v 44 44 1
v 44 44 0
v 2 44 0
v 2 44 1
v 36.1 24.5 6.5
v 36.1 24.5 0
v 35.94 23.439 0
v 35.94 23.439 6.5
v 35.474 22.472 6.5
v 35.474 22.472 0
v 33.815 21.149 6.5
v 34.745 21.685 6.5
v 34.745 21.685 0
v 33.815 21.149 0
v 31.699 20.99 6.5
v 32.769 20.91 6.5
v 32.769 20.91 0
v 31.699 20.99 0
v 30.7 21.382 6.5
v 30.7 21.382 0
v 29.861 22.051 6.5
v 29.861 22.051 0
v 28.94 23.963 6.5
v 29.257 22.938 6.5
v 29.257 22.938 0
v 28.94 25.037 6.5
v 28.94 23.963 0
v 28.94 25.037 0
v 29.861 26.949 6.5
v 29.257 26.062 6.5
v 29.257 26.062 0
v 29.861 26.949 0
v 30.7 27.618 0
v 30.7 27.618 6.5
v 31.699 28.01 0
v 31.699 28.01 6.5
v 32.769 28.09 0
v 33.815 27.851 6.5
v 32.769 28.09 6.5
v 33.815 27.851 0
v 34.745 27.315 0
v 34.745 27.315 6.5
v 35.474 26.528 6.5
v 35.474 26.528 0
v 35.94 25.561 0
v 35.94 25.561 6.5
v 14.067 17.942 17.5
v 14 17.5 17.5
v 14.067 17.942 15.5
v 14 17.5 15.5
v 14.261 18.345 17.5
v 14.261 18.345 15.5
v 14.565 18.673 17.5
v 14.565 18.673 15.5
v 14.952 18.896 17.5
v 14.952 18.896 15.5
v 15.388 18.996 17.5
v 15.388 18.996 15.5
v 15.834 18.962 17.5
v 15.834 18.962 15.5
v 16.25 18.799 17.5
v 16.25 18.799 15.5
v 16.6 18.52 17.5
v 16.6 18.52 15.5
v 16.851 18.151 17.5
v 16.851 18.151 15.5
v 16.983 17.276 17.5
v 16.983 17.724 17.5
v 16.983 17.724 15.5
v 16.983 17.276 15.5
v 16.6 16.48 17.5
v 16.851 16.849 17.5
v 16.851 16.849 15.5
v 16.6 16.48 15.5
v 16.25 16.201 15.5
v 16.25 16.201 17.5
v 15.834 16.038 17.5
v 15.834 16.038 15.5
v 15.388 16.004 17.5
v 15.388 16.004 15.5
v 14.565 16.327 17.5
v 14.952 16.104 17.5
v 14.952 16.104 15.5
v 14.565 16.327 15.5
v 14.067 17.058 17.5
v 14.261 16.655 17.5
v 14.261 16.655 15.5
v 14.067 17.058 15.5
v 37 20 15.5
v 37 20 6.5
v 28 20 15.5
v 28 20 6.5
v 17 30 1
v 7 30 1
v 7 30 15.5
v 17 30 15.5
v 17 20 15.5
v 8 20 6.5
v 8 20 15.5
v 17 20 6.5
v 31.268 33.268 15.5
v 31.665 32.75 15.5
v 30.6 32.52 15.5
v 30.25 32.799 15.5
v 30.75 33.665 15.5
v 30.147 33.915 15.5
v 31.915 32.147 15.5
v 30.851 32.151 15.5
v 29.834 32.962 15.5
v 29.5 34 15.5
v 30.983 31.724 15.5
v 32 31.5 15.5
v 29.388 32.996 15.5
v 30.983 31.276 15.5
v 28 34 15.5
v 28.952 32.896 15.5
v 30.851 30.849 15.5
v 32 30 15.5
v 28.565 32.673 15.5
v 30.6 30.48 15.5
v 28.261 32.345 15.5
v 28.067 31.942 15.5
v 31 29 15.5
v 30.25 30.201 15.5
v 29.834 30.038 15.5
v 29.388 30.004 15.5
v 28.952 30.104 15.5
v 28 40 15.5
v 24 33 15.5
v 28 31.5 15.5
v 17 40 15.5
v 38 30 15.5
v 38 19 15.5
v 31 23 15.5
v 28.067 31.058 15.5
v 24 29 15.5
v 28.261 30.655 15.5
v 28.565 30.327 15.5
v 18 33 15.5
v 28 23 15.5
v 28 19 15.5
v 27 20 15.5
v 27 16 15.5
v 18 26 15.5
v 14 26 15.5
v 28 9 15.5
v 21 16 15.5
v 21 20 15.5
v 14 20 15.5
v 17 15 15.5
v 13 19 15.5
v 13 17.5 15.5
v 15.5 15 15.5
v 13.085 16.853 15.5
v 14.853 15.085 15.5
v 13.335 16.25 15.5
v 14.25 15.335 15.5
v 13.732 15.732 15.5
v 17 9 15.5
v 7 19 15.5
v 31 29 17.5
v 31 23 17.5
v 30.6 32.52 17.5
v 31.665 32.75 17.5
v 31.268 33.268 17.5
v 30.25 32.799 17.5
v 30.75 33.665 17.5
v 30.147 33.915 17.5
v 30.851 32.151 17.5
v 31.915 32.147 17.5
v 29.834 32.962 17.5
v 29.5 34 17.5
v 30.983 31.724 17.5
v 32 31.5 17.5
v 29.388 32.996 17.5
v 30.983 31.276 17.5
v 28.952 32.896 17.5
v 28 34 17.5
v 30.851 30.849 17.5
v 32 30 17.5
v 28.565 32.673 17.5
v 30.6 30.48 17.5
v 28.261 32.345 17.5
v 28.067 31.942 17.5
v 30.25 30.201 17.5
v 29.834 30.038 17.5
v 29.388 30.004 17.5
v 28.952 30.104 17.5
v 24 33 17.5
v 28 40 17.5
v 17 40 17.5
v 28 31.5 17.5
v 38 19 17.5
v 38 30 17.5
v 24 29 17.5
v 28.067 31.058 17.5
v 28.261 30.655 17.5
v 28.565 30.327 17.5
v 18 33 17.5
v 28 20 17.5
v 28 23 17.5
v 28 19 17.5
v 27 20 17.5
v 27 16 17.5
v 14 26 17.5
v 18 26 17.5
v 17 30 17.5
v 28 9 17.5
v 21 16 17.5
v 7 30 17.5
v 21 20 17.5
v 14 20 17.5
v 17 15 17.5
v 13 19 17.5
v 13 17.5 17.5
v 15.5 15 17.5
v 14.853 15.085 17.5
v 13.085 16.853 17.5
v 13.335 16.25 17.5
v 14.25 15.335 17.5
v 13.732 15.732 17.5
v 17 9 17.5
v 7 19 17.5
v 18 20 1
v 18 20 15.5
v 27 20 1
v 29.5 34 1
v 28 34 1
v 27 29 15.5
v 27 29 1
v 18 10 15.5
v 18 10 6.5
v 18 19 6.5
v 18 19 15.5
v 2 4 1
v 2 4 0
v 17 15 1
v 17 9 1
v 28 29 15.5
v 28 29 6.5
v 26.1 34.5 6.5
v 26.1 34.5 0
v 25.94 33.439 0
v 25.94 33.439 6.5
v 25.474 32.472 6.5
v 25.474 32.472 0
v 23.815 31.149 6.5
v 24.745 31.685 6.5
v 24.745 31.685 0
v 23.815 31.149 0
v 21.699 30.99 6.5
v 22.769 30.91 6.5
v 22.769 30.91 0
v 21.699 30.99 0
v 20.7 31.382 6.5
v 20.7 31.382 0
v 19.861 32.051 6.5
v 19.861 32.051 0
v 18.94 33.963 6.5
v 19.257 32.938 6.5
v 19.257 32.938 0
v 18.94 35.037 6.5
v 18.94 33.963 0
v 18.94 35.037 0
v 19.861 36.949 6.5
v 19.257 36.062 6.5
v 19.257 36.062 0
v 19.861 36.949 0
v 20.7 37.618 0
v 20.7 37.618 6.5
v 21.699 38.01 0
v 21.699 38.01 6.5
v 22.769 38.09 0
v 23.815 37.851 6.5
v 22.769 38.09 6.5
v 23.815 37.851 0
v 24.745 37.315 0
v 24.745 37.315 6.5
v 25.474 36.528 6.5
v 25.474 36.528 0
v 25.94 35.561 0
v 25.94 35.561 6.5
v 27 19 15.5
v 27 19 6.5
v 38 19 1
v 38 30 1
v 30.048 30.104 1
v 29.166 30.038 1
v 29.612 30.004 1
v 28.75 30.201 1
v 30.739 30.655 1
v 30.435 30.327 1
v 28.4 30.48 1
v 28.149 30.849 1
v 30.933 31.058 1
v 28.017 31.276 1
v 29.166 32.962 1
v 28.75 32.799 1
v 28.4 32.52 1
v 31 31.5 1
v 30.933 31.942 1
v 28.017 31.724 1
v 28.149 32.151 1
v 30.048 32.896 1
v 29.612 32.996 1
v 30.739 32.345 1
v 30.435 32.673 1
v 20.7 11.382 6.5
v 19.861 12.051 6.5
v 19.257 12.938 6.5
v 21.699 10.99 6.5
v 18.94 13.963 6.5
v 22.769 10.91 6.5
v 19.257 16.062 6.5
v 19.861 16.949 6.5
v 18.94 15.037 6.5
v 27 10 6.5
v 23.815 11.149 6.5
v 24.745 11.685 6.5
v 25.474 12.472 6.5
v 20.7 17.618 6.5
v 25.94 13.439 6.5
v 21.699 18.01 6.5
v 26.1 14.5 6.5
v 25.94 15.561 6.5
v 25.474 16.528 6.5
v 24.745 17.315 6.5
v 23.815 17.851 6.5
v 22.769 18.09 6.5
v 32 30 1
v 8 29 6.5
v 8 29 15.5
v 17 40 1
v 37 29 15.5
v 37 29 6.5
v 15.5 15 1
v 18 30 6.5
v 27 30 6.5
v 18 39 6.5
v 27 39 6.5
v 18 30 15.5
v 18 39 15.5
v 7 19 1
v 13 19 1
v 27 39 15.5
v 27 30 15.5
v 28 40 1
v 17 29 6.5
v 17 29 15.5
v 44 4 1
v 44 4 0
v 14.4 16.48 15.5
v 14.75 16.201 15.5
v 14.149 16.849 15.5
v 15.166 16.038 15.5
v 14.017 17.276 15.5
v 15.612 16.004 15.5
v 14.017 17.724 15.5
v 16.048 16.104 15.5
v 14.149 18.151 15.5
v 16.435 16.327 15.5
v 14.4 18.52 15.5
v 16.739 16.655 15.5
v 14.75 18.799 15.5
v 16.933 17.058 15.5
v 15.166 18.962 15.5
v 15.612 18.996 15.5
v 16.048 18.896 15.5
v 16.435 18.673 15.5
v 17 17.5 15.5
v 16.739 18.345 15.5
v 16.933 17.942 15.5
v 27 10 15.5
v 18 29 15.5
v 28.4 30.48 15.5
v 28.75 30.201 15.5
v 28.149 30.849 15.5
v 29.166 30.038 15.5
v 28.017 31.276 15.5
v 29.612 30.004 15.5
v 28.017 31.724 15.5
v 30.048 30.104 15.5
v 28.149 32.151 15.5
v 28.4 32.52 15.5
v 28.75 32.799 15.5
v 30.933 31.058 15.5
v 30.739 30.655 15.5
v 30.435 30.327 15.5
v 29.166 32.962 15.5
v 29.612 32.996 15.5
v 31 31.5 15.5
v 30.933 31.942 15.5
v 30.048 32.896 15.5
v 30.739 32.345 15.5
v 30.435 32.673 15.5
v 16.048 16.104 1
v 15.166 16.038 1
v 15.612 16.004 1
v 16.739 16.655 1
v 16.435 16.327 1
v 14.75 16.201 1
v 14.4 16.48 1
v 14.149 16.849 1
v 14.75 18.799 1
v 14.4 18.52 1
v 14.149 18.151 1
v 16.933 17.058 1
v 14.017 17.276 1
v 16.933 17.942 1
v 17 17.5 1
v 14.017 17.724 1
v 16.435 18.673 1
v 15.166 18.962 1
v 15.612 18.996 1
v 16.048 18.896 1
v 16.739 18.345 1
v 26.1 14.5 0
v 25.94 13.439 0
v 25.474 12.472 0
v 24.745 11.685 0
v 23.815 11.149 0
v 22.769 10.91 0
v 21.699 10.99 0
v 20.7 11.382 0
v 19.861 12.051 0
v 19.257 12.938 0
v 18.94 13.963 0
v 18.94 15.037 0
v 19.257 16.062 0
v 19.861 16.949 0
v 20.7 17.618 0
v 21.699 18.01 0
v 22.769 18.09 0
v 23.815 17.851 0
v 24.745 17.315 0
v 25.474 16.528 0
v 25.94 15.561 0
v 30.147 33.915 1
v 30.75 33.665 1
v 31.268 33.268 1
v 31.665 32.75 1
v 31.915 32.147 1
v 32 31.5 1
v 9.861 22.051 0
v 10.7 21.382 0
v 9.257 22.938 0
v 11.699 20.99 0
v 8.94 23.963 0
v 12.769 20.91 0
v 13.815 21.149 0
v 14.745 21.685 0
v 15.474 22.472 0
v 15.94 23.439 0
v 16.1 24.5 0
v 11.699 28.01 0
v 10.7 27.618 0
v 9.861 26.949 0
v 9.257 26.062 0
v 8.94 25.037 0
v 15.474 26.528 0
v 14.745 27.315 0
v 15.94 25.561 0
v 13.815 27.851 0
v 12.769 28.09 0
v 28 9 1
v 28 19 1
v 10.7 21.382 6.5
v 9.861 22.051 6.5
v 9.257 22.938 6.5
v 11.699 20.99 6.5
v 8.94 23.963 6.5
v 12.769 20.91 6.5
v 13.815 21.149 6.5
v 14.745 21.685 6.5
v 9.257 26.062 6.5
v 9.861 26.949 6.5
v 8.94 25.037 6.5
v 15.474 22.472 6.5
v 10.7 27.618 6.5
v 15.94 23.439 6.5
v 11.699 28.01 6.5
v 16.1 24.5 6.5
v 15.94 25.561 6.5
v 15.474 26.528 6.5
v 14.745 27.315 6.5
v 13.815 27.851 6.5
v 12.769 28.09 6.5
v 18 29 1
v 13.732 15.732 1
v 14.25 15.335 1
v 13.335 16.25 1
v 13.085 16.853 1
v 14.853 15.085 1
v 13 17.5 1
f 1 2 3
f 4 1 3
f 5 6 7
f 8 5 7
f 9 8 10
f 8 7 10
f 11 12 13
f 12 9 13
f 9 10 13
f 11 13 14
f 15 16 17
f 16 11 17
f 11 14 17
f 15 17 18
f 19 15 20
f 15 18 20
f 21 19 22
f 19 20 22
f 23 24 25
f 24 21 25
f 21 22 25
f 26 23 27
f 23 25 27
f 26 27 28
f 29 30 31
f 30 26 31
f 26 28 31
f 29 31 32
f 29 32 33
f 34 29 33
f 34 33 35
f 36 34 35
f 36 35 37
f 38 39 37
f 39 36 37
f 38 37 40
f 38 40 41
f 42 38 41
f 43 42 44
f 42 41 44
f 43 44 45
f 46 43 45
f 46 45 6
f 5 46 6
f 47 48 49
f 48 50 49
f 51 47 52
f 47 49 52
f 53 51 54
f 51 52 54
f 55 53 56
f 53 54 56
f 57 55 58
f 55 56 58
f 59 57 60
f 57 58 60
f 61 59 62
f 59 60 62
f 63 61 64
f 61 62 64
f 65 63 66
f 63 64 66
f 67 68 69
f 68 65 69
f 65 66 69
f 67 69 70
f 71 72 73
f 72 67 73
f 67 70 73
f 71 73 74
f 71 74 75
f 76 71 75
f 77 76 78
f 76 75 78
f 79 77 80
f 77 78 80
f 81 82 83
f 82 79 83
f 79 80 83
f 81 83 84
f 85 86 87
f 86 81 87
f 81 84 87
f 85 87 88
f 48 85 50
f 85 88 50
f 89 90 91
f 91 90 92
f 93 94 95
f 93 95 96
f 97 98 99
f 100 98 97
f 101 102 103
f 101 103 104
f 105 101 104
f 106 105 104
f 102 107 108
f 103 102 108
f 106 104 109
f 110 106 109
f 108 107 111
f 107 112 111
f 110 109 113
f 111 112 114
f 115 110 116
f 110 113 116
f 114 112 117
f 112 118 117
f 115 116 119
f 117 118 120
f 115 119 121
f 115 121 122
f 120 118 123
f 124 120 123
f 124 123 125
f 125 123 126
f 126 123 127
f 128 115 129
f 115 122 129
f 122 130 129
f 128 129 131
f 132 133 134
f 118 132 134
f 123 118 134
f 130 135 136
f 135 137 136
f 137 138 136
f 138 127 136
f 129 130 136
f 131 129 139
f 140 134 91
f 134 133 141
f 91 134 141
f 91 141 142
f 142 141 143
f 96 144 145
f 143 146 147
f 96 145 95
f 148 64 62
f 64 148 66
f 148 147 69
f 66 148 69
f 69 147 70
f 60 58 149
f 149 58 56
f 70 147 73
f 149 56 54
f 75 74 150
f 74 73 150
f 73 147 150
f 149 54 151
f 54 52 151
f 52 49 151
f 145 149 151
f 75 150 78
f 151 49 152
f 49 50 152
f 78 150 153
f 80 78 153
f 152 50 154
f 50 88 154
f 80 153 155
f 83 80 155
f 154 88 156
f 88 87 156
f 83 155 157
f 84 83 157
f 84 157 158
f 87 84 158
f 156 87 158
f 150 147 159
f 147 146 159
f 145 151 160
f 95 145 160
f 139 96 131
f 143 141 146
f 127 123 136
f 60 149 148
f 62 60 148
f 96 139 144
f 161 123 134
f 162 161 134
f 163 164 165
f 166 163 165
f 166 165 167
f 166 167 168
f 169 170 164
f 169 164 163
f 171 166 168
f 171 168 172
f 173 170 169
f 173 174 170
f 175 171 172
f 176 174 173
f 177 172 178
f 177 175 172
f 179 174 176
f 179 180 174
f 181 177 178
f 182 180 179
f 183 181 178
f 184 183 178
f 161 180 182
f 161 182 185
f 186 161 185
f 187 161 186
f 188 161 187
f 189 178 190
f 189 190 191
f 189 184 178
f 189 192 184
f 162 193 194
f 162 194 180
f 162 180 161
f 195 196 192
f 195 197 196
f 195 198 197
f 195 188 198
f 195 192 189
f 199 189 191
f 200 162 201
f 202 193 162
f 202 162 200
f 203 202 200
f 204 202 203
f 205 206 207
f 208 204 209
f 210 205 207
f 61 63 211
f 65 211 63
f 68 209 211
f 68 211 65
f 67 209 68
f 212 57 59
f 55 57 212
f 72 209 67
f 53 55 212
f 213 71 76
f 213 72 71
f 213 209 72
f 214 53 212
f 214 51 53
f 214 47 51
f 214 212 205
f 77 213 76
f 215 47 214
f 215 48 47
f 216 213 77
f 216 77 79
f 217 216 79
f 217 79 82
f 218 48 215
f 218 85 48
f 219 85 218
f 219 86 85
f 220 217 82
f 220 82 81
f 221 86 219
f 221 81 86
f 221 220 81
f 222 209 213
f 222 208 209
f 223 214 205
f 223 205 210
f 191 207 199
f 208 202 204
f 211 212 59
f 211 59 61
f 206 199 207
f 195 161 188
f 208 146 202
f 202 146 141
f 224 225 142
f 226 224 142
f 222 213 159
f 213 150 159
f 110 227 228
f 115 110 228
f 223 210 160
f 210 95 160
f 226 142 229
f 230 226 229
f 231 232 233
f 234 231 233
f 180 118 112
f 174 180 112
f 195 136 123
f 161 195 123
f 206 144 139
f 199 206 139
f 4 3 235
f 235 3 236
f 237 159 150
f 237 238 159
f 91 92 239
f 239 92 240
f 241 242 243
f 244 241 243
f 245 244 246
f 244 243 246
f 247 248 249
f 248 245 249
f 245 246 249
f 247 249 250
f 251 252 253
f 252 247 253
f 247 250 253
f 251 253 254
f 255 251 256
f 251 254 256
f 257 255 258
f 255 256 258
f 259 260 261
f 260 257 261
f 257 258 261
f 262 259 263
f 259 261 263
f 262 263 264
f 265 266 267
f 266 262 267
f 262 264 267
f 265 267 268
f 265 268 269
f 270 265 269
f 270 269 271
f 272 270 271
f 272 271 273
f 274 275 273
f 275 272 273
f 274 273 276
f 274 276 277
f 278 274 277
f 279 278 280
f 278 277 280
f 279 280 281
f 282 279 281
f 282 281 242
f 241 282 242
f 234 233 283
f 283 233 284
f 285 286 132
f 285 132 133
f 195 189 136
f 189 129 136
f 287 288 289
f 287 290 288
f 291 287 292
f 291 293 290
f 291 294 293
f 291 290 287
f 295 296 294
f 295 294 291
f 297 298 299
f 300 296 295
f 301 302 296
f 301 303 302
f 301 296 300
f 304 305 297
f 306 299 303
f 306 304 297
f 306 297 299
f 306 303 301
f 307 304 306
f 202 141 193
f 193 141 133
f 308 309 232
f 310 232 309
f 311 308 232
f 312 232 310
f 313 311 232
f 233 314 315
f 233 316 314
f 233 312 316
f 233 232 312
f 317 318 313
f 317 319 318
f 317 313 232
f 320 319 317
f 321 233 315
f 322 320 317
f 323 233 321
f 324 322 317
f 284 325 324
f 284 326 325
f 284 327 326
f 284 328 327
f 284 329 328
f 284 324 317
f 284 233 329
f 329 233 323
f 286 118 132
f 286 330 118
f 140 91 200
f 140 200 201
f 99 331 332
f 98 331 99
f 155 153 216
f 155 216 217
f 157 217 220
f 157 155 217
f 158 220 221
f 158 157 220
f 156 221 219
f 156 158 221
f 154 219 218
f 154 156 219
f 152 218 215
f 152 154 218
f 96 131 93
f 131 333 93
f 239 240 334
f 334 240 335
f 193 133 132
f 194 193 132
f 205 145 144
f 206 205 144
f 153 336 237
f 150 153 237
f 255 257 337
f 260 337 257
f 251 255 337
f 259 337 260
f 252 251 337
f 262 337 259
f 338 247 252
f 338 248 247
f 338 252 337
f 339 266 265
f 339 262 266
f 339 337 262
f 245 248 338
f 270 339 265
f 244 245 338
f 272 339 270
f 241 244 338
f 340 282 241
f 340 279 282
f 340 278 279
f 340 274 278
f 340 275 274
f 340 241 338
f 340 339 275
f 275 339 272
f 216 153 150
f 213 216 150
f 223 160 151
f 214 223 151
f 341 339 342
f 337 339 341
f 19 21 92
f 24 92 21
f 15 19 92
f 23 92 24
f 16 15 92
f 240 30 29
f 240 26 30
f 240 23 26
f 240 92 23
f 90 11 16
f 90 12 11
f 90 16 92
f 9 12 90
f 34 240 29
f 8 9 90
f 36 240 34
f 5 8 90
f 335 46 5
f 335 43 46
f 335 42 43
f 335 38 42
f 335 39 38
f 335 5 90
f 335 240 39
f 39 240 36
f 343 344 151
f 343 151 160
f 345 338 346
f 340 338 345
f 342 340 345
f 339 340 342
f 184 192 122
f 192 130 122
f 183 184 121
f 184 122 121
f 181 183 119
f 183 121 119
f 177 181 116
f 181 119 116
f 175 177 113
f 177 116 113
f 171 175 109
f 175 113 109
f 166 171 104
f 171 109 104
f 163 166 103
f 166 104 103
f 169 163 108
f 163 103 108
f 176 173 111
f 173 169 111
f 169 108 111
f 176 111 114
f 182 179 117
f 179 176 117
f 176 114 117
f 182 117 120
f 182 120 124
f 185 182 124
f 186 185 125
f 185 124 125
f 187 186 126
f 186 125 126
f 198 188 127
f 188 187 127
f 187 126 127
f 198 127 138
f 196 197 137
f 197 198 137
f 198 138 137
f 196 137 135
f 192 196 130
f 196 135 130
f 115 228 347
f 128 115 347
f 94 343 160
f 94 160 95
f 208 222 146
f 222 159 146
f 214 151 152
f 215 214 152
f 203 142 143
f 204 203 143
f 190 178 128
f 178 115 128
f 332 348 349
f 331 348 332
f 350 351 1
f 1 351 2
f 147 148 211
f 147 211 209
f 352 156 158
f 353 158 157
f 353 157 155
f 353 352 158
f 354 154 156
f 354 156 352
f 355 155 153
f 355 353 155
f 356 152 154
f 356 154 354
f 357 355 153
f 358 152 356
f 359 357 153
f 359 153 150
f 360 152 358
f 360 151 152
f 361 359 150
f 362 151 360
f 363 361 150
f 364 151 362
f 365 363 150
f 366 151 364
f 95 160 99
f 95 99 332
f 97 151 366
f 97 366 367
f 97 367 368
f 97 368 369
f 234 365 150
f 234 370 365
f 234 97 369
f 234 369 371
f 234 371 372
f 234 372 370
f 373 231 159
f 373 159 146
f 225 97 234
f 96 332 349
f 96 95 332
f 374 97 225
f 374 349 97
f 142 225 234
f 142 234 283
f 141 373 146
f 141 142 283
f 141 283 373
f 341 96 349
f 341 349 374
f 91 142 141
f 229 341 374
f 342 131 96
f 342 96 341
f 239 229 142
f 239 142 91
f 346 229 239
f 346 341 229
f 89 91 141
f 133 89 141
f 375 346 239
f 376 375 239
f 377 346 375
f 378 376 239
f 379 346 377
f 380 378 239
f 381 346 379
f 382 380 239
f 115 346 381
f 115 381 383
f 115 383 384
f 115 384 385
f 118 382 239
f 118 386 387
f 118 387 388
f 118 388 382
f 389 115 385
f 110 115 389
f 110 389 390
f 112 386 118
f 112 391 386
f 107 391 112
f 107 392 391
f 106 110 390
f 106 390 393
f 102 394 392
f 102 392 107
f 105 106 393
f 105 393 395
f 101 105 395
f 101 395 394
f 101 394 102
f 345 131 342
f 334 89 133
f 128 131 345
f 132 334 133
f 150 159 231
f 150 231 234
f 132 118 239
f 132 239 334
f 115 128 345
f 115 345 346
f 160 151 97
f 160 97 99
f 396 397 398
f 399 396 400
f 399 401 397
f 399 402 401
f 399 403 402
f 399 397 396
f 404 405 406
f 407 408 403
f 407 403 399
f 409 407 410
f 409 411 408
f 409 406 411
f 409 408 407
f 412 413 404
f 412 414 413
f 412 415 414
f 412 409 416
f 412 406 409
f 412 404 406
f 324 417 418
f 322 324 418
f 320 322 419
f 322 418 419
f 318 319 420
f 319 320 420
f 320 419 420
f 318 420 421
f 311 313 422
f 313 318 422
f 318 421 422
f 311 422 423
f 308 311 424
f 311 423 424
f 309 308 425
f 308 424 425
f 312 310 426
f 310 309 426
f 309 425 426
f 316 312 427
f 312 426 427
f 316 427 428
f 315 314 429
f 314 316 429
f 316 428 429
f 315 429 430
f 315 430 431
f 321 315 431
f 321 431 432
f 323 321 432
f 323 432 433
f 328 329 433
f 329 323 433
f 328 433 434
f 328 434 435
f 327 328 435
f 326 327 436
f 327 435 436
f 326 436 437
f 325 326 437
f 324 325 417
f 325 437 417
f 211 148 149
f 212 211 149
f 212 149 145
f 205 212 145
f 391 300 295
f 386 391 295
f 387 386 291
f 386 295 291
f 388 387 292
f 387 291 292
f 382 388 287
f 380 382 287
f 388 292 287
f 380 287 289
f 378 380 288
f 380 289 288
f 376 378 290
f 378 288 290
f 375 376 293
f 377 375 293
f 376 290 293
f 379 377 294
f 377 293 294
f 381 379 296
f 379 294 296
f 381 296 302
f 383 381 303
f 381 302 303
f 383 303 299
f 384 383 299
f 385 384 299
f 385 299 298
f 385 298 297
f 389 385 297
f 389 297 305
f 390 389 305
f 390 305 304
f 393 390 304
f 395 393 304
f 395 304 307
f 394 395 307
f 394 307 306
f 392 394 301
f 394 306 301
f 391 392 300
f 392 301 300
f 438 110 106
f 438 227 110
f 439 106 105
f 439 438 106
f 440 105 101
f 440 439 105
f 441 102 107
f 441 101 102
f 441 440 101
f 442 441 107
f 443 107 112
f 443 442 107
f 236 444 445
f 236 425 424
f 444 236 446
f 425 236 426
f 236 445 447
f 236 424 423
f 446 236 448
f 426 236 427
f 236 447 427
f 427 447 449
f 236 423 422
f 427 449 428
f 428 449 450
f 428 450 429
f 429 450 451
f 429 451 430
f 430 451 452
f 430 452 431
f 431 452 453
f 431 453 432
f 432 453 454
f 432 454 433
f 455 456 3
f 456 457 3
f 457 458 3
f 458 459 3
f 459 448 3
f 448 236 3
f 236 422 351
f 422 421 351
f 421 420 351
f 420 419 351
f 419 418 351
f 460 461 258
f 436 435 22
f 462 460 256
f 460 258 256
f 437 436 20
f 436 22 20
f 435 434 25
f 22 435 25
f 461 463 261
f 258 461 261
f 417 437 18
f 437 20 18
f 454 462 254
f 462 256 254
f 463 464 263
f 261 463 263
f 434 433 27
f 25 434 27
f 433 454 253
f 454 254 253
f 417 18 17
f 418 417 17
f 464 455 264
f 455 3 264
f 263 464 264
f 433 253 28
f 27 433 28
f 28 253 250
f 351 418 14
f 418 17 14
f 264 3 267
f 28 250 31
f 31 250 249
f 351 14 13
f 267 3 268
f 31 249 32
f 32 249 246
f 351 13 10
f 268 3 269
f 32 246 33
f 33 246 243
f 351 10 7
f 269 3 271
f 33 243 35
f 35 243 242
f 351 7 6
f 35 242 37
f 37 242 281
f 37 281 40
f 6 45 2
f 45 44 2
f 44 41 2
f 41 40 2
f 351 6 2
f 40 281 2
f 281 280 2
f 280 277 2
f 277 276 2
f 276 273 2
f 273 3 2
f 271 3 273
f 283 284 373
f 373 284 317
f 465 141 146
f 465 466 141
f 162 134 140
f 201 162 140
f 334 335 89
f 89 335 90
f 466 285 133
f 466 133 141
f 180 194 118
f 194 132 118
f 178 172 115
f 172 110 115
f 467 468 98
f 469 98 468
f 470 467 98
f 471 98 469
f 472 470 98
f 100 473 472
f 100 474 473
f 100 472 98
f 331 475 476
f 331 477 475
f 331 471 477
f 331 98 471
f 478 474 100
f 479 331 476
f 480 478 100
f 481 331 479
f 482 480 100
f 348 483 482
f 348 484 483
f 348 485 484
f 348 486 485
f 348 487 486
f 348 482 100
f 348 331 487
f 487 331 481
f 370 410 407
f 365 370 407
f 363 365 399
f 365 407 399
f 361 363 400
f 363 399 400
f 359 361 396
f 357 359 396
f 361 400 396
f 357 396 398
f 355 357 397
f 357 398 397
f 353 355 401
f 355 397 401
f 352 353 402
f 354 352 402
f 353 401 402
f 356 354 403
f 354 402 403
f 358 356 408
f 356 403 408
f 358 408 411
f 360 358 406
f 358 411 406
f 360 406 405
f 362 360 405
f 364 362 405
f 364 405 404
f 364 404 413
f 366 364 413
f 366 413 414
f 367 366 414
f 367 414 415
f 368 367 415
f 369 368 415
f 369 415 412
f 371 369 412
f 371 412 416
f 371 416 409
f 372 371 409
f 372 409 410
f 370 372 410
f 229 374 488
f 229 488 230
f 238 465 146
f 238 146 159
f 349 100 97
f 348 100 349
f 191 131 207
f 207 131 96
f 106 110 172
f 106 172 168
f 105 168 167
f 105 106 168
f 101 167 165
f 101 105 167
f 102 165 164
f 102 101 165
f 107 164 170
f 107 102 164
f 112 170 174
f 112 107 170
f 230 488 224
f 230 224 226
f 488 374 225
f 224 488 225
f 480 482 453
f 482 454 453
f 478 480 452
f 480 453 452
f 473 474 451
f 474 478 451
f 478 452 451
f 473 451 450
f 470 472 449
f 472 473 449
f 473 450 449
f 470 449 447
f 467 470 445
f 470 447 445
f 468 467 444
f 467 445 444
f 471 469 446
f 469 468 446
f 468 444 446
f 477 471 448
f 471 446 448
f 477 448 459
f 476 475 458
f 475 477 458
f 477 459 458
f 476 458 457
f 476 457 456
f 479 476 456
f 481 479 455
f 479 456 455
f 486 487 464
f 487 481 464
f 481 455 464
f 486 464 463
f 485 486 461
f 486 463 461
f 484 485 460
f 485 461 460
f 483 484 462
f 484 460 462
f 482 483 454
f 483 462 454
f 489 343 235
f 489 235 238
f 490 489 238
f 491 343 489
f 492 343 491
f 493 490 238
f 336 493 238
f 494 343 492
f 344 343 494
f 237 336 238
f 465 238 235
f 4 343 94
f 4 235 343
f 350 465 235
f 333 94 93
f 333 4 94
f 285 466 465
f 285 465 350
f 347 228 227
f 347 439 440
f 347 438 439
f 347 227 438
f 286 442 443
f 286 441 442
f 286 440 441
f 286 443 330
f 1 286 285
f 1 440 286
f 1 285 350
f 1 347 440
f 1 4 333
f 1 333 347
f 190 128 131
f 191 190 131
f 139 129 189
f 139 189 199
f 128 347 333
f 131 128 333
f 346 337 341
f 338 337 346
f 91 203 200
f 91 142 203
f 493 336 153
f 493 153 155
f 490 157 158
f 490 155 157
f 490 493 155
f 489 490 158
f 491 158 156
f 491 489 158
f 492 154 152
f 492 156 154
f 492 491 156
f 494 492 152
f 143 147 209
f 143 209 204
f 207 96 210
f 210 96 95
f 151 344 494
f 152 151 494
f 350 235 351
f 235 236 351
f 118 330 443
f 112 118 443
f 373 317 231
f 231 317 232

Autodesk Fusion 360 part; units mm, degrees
sketch "Button Face" plane through (0, 0, 0) normal (0, 0, 1) x (1, 0, 0)
  line L0 (2, 4) -> (44, 4)
  line L1 (44, 4) -> (44, 44)
  line L2 (44, 44) -> (2, 44)
  line L3 (2, 44) -> (2, 4)
  line L4 (7, 30) -> (18, 30)
  line L5 (18, 30) -> (18, 19)
  line L6 (18, 19) -> (7, 19)
  line L7 (7, 19) -> (7, 30)
  line L8 (17, 29) -> (28, 29)
  line L9 (28, 29) -> (28, 40)
  line L10 (28, 40) -> (17, 40)
  line L11 (17, 40) -> (17, 29)
  line L12 (27, 30) -> (38, 30)
  line L13 (38, 30) -> (38, 19)
  line L14 (38, 19) -> (27, 19)
  line L15 (27, 19) -> (27, 30)
  line L16 (17, 20) -> (28, 20)
  line L17 (28, 20) -> (28, 9)
  line L18 (28, 9) -> (17, 9)
  line L19 (17, 9) -> (17, 20)
  line L20 (28, 29) -> (37, 29)
  line L21 (37, 29) -> (37, 20)
  line L22 (37, 20) -> (28, 20)
  line L23 (28, 20) -> (28, 29)
  line L24 (17, 29) -> (8, 29)
  line L25 (8, 29) -> (8, 20)
  line L26 (8, 20) -> (17, 20)
  line L27 (17, 20) -> (17, 29)
  line L28 (18, 19) -> (27, 19)
  line L29 (27, 19) -> (27, 10)
  line L30 (27, 10) -> (18, 10)
  line L31 (18, 10) -> (18, 19)
  line L32 (18, 30) -> (27, 30)
  line L33 (27, 30) -> (27, 39)
  line L34 (27, 39) -> (18, 39)
  line L35 (18, 39) -> (18, 30)
  circle A0 centre (22.5, 14.5) radius 3.6
  circle A1 centre (32.5, 24.5) radius 3.6
  circle A2 centre (22.5, 34.5) radius 3.6
  circle A3 centre (12.5, 24.5) radius 3.6
  circle A4 centre (29.5, 31.5) radius 1.5
  circle A5 centre (29.5, 31.5) radius 2.5
  line L36 (29.5, 34) -> (28, 34)
  line L37 (28, 34) -> (28, 33.5)
  line L38 (28, 33.5) -> (29.5, 33.5)
  line L39 (29.5, 33.5) -> (29.5, 34)
  line L40 (32, 31.5) -> (31.5, 31.5)
  line L41 (31.5, 31.5) -> (31.5, 30)
  line L42 (31.5, 30) -> (32, 30)
  line L43 (32, 30) -> (32, 31.5)
  circle A6 centre (15.5, 17.5) radius 1.5
  circle A7 centre (15.5, 17.5) radius 2.5
  line L44 (15.5, 15) -> (17, 15)
  line L45 (17, 15) -> (17, 15.5)
  line L46 (17, 15.5) -> (15.5, 15.5)
  line L47 (15.5, 15.5) -> (15.5, 15)
  line L48 (13, 17.5) -> (13.5, 17.5)
  line L49 (13.5, 17.5) -> (13.5, 19)
  line L50 (13.5, 19) -> (13, 19)
  line L51 (13, 19) -> (13, 17.5)
  dimension "d3" = 11
  dimension "d4" = 11
  dimension "d5" = 11
  dimension "d6" = 11
  dimension "d7" = 11
  dimension "d8" = 11
  dimension "d9" = 11
  dimension "d10" = 11
  dimension "d11" = 1
  dimension "d12" = 1
  dimension "d13" = 1
  dimension "d14" = 1
  dimension "d15" = 1
  dimension "d16" = 1
  dimension "d17" = 9
  dimension "d18" = 9
  dimension "d19" = 9
  dimension "d20" = 9
  dimension "d21" = 9
  dimension "d22" = 9
  dimension "d23" = 9
  dimension "d24" = 9
  dimension "d25" = 7.2
  dimension "d26" = 4.5
  dimension "d27" = 4.5
  dimension "d28" = 7.2
  dimension "d29" = 7.2
  dimension "d30" = 7.2
  dimension "d31" = 4.5
  dimension "d32" = 4.5
  dimension "d33" = 4.5
  dimension "d34" = 4.5
  dimension "d35" = 4.5
  dimension "d36" = 4.5
  dimension "d38" = 3
  dimension "d39" = 1.5
  dimension "d40" = 1.5
  dimension "d41" = 5
  dimension "d42" = 3
  dimension "d43" = 1.5
  dimension "d44" = 1.5
  dimension "d45" = 5
extrude "Extrude1" add sketch "Button Face" along normal blind 1 contours L0 L1 L2 L3 | L5 L8 L15 L16 makes body 1 at (36.6667, 10.6667, 0) makes body 2 at (21, 26, 0)
extrude "Extrude2" add sketch "Button Face" along normal blind 15.5 contours L4 L6 L7 L11 L24 L25 L26 A7 L50 | L4 L9 L10 L11 L33 L34 L35 A5 L37 | L4 L5 L8 L11 | L5 L8 L15 L32 | L5 L8 L16 L27 | L6 A7 L50 L51 | L12 L33 A5 | L8 L9 L12 L15 A5 | L5 L6 L16 L19 A7 | L19 L26 A7 | L6 L19 A7 | A7 L48 L49 | L6 L19 A6 A7 L46 L47 L48 L49 | L5 L15 L16 L28 | L8 L15 L16 L23 | L9 L12 A5 | L9 L12 A5 | L9 A5 L36 L37 | L6 L19 A7 | L6 L19 A6 | A7 L46 L47 | L19 A7 L44 L45 | L6 L31 A7 | L14 L15 L16 L17 | L9 L20 A5 | L9 L12 A5 | L9 L12 A4 | L9 L12 A4 A5 L38 L39 L40 L41 | A5 L38 L39 | L6 L19 A7 | L14 L17 L18 L19 L29 L30 L31 A7 L45 | L12 L13 L14 L17 L20 L21 L22 A5 L42 | L12 A5 L42 L43 | A5 L40 L41 bodies 1 2
extrude "Extrude3" add sketch "Button Face" along normal blind 1 contours A6 | A4 bodies 1
extrude "Extrude4" add sketch "Button Face" along normal blind 6.5 contours L32 L33 L34 L35 | L24 L25 L26 L27 | L28 L29 L30 L31 | L20 L21 L22 L23 bodies 1
sketch "Button Back" plane through (0, 0, 15.5) normal (0, 0, 1) x (-1, 0, 0)
  line L0 (-27, -10) -> (-18, -10)
  line L1 (-18, -10) -> (-18, -19)
  line L2 (-18, -19) -> (-27, -19)
  line L3 (-27, -19) -> (-27, -10)
  circle A0 centre (-15.5, -17.5) radius 1.5
  line L4 (-18, -20) -> (-18, -29)
  line L5 (-18, -29) -> (-27, -29)
  line L6 (-27, -29) -> (-27, -20)
  line L7 (-27, -20) -> (-18, -20)
  line L8 (-37, -20) -> (-28, -20)
  line L9 (-28, -20) -> (-28, -29)
  line L10 (-28, -29) -> (-37, -29)
  line L11 (-37, -29) -> (-37, -20)
  circle A1 centre (-29.5, -31.5) radius 1.5
  line L12 (-18, -30) -> (-18, -39)
  line L13 (-18, -39) -> (-27, -39)
  line L14 (-27, -39) -> (-27, -30)
  line L15 (-27, -30) -> (-18, -30)
  line L16 (-17, -29) -> (-17, -20)
  line L17 (-17, -20) -> (-8, -20)
  line L18 (-8, -20) -> (-8, -29)
  line L19 (-8, -29) -> (-17, -29)
  line L20 (-7, -19) -> (-13, -19)
  line L21 (-13, -19) -> (-13, -17.5)
  arc A2 (-13, -17.5) -> (-15.5, -15) centre (-15.5, -17.5) ccw
  line L22 (-15.5, -15) -> (-17, -15)
  line L23 (-17, -15) -> (-17, -9)
  line L24 (-17, -9) -> (-28, -9)
  line L25 (-28, -9) -> (-28, -19)
  line L26 (-28, -19) -> (-38, -19)
  line L27 (-38, -19) -> (-38, -30)
  line L28 (-38, -30) -> (-32, -30)
  line L29 (-32, -30) -> (-32, -31.5)
  arc A3 (-32, -31.5) -> (-29.5, -34) centre (-29.5, -31.5) ccw
  line L30 (-29.5, -34) -> (-28, -34)
  line L31 (-28, -34) -> (-28, -40)
  line L32 (-28, -40) -> (-17, -40)
  line L33 (-17, -40) -> (-17, -30)
  line L34 (-17, -30) -> (-7, -30)
  line L35 (-7, -30) -> (-7, -19)
  line L36 (-8, -29) -> (-17, -29)
  line L37 (-17, -29) -> (-17, -20)
  line L38 (-17, -20) -> (-8, -20)
  line L39 (-8, -20) -> (-8, -29)
  line L40 (-18, -19) -> (-27, -19)
  line L41 (-27, -19) -> (-27, -10)
  line L42 (-27, -10) -> (-18, -10)
  line L43 (-18, -10) -> (-18, -19)
  line L44 (-28, -20) -> (-37, -20)
  line L45 (-37, -20) -> (-37, -29)
  line L46 (-37, -29) -> (-28, -29)
  line L47 (-28, -29) -> (-28, -20)
  line L48 (-27, -30) -> (-18, -30)
  line L49 (-18, -30) -> (-18, -39)
  line L50 (-18, -39) -> (-27, -39)
  line L51 (-27, -39) -> (-27, -30)
  line L52 (-27, -19) -> (-21, -19)
  line L53 (-21, -19) -> (-21, -16)
  line L54 (-21, -16) -> (-27, -16)
  line L55 (-27, -16) -> (-27, -19)
  line L56 (-28, -29) -> (-31, -29)
  line L57 (-31, -29) -> (-31, -23)
  line L58 (-31, -23) -> (-28, -23)
  line L59 (-28, -23) -> (-28, -29)
  line L60 (-18, -30) -> (-24, -30)
  line L61 (-24, -30) -> (-24, -33)
  line L62 (-24, -33) -> (-18, -33)
  line L63 (-18, -33) -> (-18, -30)
  line L64 (-17, -20) -> (-14, -20)
  line L65 (-14, -20) -> (-14, -26)
  line L66 (-14, -26) -> (-17, -26)
  line L67 (-17, -26) -> (-17, -20)
  dimension "d66" = 6
  dimension "d67" = 3
  dimension "d68" = 3
  dimension "d69" = 6
  dimension "d70" = 6
  dimension "d71" = 3
  dimension "d72" = 3
  dimension "d73" = 6
extrude "Extrude5" add sketch "Button Back" along normal blind 1 separate body contours L0 L1 L2 L3 L40 L41 L42 L43 L53 L54 | L8 L9 L10 L11 L44 L45 L46 L47 L57 L58 | L12 L13 L14 L15 L48 L49 L50 L51 L61 L62 | L16 L17 L18 L19 L36 L37 L38 L39 L65 L66 | L20 L21 A2 L22 L23 L24 L25 L26 L27 L28 L29 A3 L30 L31 L32 L33 L34 L35 makes body 3
sketch "Back Wire" plane through (0, 0, 16.5) normal (0, 0, 1) x (-1, 0, 0)
  line L0 (-17, -26) -> (-17, -20)
  line L1 (-18, -30) -> (-18, -33)
  line L2 (-24, -30) -> (-18, -30)
  circle A0 centre (-15.5, -17.5) radius 1.5
  line L3 (-28, -23) -> (-28, -29)
  circle A1 centre (-29.5, -31.5) radius 1.5
  line L4 (-27, -29) -> (-27, -20)
  line L5 (-27, -20) -> (-18, -20)
  line L6 (-18, -20) -> (-18, -29)
  line L7 (-18, -29) -> (-27, -29)
  line L8 (-27, -19) -> (-27, -16)
  line L9 (-21, -19) -> (-27, -19)
  line L10 (-7, -30) -> (-7, -19)
  line L11 (-7, -19) -> (-13, -19)
  line L12 (-13, -19) -> (-13, -17.5)
  arc A2 (-13, -17.5) -> (-15.5, -15) centre (-15.5, -17.5) ccw
  line L13 (-15.5, -15) -> (-17, -15)
  line L14 (-17, -15) -> (-17, -9)
  line L15 (-17, -9) -> (-28, -9)
  line L16 (-28, -9) -> (-28, -19)
  line L17 (-28, -19) -> (-38, -19)
  line L18 (-38, -19) -> (-38, -30)
  line L19 (-38, -30) -> (-32, -30)
  line L20 (-32, -30) -> (-32, -31.5)
  arc A3 (-32, -31.5) -> (-29.5, -34) centre (-29.5, -31.5) ccw
  line L21 (-29.5, -34) -> (-28, -34)
  line L22 (-28, -34) -> (-28, -40)
  line L23 (-28, -40) -> (-17, -40)
  line L24 (-17, -40) -> (-17, -30)
  line L25 (-17, -30) -> (-7, -30)
  line L26 (-17, -26) -> (-18, -26)
  line L27 (-18, -26) -> (-18, -20)
  line L28 (-18, -20) -> (-17, -20)
  line L29 (-17, -20) -> (-17, -26)
  line L30 (-18, -30) -> (-24, -30)
  line L31 (-24, -30) -> (-24, -29)
  line L32 (-24, -29) -> (-18, -29)
  line L33 (-18, -29) -> (-18, -30)
  line L34 (-27, -19) -> (-21, -19)
  line L35 (-21, -19) -> (-21, -20)
  line L36 (-21, -20) -> (-27, -20)
  line L37 (-27, -20) -> (-27, -19)
  line L38 (-27, -20) -> (-28, -20)
  line L39 (-28, -20) -> (-28, -29)
  line L40 (-28, -29) -> (-27, -29)
  line L41 (-27, -29) -> (-27, -20)
  line L42 (-28, -29) -> (-31, -29)
  line L43 (-17, -20) -> (-14, -20)
  line L44 (-18, -33) -> (-24, -33)
  line L45 (-24, -33) -> (-24, -30)
  line L46 (-27, -16) -> (-21, -16)
  line L47 (-21, -16) -> (-21, -19)
  line L48 (-14, -26) -> (-17, -26)
  line L49 (-14, -20) -> (-14, -26)
  line L50 (-31, -23) -> (-28, -23)
  line L51 (-31, -29) -> (-31, -23)
extrude "Extrude6" cut sketch "Back Wire" against normal blind 1 contours L0 L6 L26 L27 L28 L29 | L2 L7 L30 L31 L32 L33 | L5 L9 L34 L35 L36 L37 | L3 L4 L38 L39 L40 L41 bodies 3
copy_body "Body->Comp1" bodies 1 removing the originals makes body 4 in component "Button Holder Face"
copy_body "Body->Comp2" bodies 3 removing the originals makes body 5 in component "Button Holder Back"
extrude "Extrude1'" add 1 faces at (23, 37.6667, 16.5) along direction (0, 0, 1) blind 1 on bodies 5 bodies 5 in component "Button Holder Back"
component "Button Holder Face" placed x (1, 0, 0) y (0, 1, 0) z (0, 0, 1) at (0, 0, 0)
component "Button Holder Back" placed x (1, 0, 0) y (0, 1, 0) z (0, 0, 1) at (0, 0, 0)
equation "d48 = 6.5 mm + 9 mm"
